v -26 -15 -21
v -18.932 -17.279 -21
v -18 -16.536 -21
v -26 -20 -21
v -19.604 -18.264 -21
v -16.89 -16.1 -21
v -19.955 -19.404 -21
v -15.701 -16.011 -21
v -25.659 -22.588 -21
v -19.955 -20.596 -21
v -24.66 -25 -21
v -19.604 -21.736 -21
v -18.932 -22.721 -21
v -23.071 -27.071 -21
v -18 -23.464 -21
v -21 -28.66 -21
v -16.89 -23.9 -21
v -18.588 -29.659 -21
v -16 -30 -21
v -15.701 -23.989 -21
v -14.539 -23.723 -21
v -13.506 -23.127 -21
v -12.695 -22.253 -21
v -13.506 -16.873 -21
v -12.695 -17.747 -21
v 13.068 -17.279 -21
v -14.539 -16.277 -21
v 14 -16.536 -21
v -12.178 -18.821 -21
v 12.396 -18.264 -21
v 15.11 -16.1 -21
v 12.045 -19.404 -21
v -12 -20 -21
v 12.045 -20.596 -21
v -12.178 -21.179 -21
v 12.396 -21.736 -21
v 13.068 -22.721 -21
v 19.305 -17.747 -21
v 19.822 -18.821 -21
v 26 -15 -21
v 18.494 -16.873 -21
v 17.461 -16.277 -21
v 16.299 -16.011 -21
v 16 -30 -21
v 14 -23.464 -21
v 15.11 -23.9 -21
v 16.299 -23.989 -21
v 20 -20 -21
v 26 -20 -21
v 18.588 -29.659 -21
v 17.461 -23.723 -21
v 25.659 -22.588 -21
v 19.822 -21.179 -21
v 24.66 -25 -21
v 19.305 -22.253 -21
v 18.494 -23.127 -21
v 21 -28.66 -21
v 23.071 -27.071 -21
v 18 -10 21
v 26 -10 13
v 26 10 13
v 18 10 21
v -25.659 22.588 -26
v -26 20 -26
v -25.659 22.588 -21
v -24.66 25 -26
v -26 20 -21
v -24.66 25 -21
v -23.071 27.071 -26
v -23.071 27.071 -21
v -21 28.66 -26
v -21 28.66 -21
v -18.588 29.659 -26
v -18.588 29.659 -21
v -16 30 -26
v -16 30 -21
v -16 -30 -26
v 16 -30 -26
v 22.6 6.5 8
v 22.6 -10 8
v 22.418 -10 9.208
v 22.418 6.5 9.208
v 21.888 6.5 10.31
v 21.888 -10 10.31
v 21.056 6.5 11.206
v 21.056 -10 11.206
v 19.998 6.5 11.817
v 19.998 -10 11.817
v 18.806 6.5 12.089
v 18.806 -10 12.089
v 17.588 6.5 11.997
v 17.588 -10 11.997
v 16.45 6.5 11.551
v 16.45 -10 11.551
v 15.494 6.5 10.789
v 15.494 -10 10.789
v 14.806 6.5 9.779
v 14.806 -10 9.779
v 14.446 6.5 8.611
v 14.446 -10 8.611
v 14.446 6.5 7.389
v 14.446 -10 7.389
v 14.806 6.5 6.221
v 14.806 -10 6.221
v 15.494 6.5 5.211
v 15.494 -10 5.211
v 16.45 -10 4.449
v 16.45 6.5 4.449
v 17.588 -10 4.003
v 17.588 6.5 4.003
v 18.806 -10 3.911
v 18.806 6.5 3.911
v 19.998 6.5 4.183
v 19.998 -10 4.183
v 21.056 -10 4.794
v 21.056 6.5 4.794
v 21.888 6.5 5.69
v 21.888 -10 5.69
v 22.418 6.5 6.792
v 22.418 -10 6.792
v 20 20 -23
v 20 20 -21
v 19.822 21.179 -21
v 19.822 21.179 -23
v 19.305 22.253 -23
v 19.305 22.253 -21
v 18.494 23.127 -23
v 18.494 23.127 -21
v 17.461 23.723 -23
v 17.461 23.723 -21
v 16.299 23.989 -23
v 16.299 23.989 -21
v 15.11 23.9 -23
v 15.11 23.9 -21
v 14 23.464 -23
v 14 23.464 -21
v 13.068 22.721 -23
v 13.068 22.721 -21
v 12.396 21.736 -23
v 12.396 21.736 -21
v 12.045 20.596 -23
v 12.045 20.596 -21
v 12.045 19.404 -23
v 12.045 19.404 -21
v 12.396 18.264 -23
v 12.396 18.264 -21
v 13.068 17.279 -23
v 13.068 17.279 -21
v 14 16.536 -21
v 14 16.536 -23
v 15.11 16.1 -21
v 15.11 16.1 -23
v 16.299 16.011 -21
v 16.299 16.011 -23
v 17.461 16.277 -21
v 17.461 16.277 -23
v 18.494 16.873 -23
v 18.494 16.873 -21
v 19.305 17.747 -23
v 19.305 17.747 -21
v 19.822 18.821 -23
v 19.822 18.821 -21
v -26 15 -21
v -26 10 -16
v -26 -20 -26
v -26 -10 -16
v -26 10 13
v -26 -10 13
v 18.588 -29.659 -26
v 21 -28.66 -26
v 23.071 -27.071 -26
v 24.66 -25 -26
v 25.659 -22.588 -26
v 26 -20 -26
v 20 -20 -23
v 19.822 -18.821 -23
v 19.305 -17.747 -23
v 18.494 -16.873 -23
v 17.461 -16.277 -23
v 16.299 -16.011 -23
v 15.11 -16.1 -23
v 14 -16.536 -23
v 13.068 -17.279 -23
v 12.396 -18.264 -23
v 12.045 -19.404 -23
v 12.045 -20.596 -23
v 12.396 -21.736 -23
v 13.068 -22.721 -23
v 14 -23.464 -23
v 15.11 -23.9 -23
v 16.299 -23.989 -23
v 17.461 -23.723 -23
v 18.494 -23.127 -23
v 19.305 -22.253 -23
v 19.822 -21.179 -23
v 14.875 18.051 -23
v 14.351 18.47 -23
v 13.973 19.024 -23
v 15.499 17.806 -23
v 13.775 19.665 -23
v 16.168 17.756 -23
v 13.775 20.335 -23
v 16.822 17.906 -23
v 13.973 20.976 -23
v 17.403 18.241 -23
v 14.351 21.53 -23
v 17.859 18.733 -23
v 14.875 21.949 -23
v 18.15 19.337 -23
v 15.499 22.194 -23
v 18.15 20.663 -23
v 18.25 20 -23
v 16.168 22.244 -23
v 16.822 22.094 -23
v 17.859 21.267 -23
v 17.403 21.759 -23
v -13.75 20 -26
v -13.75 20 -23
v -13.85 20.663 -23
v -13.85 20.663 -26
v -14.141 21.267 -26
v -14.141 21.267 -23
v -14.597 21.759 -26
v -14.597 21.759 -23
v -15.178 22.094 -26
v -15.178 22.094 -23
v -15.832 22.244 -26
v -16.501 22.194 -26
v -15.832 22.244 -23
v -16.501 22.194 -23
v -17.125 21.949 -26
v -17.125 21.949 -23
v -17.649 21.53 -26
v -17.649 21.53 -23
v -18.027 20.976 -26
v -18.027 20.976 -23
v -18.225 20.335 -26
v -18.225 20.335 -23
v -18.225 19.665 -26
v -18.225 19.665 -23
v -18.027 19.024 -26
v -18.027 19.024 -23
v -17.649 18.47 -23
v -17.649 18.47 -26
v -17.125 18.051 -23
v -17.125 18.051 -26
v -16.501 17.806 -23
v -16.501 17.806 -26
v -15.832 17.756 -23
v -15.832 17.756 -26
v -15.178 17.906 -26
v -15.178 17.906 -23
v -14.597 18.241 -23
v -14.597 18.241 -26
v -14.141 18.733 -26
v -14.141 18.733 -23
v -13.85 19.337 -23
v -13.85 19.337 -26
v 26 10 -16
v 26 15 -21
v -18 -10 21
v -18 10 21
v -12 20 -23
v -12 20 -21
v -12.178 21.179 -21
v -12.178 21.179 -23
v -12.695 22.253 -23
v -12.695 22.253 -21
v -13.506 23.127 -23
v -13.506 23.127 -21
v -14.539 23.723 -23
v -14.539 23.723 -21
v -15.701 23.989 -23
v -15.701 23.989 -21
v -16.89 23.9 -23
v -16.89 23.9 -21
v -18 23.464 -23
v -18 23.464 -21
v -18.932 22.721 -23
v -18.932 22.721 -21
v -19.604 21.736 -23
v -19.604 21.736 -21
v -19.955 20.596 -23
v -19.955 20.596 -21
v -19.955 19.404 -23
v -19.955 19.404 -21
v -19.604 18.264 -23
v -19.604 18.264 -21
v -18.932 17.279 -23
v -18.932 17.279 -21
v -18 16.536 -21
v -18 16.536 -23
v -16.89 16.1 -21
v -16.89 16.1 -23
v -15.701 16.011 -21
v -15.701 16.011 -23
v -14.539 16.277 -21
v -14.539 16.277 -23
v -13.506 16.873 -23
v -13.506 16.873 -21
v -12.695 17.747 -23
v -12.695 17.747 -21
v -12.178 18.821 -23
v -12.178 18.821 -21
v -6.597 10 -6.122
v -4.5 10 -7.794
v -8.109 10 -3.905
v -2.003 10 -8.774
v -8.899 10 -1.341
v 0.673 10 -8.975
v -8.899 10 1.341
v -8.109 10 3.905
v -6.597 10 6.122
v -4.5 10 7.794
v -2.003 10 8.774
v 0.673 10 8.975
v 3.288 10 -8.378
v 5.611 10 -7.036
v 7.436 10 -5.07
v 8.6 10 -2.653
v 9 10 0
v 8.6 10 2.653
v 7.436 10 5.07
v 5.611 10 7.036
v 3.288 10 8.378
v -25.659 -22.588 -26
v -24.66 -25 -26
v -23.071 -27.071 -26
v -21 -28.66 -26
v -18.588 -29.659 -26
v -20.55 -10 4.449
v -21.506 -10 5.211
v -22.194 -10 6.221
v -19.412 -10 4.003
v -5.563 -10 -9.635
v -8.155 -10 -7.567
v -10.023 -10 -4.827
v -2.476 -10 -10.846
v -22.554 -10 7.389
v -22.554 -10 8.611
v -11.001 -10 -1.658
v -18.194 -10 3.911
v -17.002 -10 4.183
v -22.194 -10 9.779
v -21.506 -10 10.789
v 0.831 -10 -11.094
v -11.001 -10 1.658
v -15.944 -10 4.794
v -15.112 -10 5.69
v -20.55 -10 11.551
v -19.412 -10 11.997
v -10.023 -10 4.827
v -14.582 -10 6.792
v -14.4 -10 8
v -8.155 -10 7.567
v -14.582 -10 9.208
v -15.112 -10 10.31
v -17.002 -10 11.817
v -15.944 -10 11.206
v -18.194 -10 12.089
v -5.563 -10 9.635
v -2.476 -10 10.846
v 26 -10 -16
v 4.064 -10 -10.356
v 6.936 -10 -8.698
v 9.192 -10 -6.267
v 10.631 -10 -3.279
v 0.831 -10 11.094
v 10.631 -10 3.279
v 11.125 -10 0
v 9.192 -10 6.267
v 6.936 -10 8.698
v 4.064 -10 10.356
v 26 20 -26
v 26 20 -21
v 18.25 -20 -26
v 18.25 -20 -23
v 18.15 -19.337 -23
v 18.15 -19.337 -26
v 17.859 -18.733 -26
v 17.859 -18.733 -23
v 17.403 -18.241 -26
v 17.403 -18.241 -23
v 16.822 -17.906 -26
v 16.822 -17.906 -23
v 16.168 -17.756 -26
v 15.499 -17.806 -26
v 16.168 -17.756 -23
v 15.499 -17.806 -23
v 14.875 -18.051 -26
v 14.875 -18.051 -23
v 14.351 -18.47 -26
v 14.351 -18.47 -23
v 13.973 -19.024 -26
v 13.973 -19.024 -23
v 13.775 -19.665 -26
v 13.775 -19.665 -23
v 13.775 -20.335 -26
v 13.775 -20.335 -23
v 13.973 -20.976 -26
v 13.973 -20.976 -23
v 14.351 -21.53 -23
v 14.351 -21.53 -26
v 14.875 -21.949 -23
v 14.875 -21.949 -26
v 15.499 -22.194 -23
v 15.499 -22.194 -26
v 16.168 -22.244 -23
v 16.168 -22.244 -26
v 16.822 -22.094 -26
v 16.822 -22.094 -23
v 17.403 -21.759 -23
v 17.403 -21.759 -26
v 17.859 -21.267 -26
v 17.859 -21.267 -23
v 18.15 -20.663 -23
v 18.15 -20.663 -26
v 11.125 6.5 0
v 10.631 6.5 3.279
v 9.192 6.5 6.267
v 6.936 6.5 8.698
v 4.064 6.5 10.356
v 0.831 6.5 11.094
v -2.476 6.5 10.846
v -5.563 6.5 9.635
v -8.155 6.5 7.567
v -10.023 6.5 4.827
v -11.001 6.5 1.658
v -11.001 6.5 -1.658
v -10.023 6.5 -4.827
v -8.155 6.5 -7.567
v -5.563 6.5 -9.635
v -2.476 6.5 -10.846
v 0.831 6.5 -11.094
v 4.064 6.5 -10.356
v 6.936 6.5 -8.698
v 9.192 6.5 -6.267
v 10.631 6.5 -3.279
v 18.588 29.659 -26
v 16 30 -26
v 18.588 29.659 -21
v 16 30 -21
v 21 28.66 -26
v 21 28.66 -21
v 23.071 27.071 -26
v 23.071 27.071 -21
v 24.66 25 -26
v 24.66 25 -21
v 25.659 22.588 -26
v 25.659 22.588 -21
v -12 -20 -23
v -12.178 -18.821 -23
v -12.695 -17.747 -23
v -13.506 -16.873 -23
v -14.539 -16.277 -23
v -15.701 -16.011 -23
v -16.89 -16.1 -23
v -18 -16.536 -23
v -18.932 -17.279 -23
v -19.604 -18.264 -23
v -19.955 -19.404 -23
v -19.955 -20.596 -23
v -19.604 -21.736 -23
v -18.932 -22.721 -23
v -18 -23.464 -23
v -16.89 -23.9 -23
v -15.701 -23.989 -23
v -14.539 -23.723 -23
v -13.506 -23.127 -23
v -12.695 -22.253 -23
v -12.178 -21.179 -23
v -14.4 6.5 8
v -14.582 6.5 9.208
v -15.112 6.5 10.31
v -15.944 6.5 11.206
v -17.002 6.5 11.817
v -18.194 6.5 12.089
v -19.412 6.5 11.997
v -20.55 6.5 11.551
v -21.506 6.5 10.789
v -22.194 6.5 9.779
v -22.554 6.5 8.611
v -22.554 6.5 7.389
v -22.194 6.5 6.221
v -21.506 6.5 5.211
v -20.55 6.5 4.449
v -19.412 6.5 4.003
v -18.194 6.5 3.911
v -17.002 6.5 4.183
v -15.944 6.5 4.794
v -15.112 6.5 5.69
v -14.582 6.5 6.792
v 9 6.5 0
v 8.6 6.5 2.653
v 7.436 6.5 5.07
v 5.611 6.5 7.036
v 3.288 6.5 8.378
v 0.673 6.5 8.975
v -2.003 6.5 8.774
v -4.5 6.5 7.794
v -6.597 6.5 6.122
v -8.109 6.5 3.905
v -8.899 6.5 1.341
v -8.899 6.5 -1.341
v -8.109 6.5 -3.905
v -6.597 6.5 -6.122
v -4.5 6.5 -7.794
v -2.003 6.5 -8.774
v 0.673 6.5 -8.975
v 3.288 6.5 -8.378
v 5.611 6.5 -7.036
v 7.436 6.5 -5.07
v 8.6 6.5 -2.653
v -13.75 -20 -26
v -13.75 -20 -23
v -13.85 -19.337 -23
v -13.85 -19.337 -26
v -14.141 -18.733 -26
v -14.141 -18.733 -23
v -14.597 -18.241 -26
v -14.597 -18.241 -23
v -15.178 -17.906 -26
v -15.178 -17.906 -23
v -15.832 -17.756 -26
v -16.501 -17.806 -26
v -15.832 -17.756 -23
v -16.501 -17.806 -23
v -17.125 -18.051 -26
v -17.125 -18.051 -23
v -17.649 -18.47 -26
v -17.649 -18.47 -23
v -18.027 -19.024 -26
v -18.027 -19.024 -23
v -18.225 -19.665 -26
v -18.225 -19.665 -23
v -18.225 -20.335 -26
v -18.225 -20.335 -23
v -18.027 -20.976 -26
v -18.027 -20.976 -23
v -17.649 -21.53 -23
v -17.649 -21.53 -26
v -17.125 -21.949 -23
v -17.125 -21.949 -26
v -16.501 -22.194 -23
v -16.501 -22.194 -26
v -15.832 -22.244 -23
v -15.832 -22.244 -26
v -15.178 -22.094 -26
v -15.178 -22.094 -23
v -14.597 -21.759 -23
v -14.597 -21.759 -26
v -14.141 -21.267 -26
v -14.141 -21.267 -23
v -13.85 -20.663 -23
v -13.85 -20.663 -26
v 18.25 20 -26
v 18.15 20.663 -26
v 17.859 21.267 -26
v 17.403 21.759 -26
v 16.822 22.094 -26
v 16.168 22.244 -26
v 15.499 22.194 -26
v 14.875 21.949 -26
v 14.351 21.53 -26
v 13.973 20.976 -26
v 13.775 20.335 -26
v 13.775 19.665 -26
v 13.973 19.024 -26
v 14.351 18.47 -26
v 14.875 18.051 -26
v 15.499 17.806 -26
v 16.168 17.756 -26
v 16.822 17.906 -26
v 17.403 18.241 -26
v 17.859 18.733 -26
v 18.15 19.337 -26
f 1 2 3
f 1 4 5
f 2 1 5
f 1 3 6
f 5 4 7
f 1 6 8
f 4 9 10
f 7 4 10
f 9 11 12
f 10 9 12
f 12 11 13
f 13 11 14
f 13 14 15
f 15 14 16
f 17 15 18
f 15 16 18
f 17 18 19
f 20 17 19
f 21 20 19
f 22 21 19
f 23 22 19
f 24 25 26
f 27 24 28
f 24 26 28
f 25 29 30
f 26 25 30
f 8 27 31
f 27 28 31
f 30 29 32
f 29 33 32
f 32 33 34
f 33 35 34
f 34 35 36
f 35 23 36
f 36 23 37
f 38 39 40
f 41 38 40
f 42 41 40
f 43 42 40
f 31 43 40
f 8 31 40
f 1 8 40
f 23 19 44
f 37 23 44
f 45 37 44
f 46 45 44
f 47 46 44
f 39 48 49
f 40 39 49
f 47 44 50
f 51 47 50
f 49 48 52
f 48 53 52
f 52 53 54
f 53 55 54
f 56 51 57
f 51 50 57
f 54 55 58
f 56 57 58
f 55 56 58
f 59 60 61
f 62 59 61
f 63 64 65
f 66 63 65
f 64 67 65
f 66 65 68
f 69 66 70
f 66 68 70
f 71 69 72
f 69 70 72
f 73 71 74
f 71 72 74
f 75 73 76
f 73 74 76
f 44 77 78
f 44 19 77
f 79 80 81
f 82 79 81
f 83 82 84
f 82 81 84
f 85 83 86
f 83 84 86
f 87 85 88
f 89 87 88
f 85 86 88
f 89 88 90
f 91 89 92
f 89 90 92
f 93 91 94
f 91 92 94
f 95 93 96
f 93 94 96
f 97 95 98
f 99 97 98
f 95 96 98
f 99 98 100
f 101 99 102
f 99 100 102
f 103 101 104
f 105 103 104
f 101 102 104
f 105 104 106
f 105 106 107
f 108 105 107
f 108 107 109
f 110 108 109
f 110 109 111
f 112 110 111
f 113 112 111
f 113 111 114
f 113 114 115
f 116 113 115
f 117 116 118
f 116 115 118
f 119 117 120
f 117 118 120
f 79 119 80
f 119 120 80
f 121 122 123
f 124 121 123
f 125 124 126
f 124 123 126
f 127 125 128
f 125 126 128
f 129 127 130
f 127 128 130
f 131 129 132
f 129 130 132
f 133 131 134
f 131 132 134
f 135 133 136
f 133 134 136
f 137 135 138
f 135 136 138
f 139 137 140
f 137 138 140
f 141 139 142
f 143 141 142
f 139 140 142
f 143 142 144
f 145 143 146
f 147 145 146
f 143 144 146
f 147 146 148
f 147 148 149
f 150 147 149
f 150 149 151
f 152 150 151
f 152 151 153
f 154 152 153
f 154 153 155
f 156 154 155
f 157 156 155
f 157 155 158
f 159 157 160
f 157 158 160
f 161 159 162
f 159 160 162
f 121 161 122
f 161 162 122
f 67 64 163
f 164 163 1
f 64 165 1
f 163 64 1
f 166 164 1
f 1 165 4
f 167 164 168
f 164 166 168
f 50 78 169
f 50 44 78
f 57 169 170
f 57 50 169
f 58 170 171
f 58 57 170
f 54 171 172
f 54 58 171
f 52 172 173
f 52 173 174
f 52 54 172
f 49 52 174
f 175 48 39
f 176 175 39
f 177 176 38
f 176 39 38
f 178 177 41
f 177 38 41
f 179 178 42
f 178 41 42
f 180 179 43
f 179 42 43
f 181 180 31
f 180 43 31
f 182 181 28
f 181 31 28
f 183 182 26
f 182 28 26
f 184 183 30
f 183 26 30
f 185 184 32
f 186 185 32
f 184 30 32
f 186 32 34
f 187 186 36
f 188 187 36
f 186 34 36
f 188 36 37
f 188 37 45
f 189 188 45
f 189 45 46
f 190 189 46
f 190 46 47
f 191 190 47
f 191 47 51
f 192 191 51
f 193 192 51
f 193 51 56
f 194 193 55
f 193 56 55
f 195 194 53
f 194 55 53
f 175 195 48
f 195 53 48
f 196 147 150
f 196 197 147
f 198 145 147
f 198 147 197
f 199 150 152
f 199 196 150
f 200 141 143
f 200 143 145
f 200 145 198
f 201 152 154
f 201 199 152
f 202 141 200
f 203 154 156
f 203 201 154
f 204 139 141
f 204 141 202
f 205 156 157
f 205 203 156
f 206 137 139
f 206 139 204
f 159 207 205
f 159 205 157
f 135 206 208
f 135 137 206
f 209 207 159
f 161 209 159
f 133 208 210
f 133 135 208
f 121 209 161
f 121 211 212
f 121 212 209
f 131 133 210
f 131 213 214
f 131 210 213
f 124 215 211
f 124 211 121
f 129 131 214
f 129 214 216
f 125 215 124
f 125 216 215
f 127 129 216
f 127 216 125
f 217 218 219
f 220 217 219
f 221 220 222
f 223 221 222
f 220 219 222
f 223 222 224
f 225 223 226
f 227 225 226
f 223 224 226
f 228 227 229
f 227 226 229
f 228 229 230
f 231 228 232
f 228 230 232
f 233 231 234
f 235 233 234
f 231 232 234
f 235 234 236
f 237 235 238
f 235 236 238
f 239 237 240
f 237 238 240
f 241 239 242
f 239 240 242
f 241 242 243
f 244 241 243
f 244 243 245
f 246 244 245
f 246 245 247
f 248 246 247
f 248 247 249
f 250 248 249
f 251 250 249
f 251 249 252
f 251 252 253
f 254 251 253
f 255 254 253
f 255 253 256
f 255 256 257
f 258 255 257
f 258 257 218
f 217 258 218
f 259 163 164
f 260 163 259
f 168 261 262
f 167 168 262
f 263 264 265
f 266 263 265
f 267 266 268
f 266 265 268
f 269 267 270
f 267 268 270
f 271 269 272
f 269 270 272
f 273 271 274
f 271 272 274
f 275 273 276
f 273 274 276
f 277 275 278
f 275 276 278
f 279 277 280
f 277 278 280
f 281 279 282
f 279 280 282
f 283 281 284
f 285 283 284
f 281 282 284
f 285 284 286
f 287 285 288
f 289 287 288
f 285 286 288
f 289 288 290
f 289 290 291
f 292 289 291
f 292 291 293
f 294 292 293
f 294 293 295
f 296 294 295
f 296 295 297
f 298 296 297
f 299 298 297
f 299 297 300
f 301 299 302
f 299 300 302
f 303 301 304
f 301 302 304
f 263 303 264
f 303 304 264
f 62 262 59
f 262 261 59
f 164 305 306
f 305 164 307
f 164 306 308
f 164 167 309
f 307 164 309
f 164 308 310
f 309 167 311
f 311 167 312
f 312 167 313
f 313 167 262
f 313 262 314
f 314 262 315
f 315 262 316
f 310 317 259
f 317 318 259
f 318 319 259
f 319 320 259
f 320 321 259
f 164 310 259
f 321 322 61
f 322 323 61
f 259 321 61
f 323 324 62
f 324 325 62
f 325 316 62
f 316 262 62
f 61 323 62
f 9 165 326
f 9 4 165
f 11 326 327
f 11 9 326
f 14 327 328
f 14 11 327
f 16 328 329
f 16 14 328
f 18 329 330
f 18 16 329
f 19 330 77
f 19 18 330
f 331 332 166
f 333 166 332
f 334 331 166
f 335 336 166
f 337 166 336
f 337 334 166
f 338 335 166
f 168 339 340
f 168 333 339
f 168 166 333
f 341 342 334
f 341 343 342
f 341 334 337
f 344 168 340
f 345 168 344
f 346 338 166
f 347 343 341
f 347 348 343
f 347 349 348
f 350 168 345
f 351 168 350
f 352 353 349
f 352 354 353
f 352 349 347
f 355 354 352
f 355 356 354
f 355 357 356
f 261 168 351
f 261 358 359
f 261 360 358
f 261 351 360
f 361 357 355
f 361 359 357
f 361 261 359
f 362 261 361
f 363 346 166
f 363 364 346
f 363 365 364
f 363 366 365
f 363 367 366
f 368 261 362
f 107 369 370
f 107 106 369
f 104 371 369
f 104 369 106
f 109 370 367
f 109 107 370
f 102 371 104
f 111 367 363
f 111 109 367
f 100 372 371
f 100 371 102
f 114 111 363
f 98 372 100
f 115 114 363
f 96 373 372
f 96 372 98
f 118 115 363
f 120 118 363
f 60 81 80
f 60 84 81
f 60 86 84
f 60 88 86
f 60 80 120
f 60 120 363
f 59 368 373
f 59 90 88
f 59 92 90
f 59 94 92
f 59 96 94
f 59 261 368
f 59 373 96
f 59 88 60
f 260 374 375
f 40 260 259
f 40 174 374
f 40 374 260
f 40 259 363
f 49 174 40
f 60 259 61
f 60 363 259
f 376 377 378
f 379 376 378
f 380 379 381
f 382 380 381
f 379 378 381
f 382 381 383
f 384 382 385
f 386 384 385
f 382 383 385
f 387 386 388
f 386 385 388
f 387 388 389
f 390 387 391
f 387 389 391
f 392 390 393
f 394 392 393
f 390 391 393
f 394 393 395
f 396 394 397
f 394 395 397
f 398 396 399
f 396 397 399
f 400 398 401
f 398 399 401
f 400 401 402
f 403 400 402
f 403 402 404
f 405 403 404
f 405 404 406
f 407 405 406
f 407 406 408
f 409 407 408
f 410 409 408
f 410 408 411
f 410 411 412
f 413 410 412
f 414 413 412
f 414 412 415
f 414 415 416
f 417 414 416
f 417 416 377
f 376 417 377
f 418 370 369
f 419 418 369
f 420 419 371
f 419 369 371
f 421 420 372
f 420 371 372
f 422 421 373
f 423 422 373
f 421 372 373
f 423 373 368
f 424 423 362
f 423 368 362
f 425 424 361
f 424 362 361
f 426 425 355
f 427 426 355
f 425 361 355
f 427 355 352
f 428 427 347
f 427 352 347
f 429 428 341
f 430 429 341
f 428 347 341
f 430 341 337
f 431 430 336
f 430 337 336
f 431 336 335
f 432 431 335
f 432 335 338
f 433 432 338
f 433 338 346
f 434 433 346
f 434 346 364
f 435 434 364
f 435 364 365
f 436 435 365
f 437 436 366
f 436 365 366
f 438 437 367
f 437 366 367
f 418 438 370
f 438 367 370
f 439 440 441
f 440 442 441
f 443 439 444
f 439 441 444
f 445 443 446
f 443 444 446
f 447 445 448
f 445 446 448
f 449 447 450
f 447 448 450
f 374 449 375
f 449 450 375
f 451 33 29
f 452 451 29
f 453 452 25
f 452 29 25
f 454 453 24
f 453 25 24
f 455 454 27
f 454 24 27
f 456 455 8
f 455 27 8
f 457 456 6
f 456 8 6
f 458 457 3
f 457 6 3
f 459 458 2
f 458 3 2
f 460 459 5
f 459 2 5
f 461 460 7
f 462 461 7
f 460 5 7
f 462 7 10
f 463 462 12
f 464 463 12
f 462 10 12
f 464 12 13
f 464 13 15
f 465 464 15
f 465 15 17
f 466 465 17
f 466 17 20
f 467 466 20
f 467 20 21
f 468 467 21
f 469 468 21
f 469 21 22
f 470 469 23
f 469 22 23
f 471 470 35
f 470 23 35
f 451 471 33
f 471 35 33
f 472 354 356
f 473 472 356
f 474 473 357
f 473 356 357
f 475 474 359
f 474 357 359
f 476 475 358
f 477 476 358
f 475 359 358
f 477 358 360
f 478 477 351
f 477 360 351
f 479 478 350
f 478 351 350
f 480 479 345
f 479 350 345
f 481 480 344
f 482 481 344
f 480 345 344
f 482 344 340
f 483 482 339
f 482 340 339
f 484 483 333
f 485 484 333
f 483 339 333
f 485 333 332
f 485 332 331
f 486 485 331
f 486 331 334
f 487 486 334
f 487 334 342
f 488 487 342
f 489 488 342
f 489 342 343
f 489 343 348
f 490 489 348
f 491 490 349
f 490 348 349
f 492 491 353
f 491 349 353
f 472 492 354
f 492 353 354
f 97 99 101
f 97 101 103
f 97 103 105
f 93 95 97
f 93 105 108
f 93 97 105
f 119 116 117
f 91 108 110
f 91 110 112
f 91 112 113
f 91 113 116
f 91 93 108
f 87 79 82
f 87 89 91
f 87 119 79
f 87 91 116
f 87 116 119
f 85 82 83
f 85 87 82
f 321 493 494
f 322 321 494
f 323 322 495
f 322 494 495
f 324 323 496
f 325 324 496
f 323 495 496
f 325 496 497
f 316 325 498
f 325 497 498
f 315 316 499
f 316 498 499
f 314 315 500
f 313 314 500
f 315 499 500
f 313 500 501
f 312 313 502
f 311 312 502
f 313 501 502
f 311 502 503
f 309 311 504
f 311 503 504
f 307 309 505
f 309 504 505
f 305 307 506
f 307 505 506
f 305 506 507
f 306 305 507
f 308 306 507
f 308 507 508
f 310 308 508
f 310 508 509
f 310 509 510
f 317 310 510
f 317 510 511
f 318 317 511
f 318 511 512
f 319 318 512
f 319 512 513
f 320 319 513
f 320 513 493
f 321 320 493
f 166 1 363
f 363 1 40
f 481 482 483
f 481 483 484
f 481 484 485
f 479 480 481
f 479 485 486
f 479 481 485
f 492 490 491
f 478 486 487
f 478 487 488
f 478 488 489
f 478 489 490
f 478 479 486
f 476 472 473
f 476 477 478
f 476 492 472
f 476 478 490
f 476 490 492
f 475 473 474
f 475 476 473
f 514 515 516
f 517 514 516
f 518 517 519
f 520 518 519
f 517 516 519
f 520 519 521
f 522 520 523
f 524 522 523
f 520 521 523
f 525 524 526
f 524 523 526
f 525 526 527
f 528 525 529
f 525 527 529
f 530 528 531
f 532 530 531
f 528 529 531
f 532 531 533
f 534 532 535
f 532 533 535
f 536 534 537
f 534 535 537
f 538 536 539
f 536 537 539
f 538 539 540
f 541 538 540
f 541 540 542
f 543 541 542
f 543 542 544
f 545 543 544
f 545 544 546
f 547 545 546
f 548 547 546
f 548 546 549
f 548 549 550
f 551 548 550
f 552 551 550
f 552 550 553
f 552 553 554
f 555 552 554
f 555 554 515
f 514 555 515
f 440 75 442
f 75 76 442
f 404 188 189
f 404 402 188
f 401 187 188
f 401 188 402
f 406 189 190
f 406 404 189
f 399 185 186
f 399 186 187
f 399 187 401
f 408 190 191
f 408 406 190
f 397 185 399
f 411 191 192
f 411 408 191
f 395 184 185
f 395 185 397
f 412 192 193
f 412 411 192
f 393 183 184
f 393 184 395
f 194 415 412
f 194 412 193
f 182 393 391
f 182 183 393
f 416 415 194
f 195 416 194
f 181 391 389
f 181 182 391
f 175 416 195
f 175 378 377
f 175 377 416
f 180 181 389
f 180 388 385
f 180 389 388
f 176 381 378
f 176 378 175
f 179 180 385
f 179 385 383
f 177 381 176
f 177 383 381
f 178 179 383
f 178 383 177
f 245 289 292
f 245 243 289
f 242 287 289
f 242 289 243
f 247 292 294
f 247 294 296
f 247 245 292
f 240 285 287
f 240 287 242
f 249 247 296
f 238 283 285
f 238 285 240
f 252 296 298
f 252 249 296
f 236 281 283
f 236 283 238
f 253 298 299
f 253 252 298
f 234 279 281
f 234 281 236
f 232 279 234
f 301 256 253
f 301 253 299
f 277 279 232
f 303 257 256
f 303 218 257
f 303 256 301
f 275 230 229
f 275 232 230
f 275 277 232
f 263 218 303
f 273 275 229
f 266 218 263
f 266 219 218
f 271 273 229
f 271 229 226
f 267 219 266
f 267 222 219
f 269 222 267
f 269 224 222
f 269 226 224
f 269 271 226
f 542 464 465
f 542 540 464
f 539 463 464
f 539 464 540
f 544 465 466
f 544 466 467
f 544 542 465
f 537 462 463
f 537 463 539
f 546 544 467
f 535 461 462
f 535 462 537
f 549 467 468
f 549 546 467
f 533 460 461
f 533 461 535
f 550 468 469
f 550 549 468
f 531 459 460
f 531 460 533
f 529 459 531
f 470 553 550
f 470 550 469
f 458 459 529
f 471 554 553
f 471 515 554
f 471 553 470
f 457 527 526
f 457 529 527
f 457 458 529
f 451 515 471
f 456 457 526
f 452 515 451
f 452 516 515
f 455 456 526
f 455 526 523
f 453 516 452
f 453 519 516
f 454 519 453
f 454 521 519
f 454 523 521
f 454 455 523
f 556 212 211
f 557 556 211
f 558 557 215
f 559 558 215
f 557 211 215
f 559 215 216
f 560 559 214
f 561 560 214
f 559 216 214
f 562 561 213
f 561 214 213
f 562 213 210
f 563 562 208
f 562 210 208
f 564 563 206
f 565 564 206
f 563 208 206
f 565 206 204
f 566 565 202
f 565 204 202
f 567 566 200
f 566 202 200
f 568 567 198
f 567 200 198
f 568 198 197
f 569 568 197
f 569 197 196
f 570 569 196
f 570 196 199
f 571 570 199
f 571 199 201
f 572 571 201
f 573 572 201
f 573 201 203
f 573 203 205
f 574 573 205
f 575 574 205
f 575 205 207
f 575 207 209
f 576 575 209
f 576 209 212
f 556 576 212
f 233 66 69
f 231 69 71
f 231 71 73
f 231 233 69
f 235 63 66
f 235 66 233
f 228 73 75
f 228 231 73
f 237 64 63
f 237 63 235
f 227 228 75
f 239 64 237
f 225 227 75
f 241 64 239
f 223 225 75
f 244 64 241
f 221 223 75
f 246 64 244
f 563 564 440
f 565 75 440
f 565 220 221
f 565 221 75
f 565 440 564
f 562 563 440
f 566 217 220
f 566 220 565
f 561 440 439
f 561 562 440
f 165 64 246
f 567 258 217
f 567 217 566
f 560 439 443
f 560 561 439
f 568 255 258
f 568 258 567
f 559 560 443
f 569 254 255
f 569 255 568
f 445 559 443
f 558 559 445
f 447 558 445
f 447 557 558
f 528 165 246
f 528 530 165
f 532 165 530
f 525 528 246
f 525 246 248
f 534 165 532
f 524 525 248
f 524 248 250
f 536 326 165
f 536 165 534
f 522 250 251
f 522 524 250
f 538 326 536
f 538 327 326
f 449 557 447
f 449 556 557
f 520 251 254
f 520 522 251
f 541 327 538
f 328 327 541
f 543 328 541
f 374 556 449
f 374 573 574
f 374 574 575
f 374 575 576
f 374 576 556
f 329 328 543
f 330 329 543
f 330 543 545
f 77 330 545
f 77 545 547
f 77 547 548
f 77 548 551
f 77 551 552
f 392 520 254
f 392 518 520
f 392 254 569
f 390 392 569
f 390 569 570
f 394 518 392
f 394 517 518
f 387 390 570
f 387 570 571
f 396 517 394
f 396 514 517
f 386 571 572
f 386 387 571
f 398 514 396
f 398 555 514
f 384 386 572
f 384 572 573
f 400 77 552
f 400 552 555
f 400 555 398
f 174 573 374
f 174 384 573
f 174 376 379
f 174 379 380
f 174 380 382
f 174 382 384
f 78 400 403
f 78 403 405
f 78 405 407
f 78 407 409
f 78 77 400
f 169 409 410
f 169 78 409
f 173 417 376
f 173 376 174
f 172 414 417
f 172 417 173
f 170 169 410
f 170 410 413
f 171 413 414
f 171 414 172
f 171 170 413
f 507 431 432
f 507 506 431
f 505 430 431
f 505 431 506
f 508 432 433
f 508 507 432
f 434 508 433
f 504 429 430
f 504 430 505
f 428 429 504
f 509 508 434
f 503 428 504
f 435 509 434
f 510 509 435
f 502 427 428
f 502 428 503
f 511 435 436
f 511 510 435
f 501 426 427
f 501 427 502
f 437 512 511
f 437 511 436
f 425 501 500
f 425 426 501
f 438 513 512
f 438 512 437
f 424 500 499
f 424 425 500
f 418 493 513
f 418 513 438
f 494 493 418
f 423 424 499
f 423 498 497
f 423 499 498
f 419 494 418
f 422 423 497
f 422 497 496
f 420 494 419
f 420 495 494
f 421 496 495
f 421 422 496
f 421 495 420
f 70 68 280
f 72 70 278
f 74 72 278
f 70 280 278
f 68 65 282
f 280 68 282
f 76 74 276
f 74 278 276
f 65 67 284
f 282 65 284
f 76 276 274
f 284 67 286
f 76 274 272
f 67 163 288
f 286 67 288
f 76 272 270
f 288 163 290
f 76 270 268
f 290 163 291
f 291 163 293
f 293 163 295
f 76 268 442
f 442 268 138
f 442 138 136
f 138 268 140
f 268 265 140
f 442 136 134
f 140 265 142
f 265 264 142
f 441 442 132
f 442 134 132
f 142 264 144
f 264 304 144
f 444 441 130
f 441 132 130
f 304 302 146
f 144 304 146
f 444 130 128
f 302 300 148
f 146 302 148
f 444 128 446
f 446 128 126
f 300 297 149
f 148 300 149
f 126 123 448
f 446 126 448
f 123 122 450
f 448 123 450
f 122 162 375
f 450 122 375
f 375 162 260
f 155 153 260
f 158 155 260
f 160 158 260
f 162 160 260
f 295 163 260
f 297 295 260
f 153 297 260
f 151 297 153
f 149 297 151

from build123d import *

# Parameters (mm, degrees)
F0_W      = 52
F0_H      = 42
F1_DEPTH  = 10
F2_W      = 52
F2_H      = 5
F3_DEPTH  = 30
F4_R      = 9
F5_DEPTH  = 40.001
F6_R      = 11.125
F6_R_2    = 4.1
F7_DEPTH  = 16.5
F8_R      = 2.25
F9_DEPTH  = 5.001
F10_R     = 4
F11_DEPTH = 2
F12_SIZE  = 8
F13_SIZE  = 5
F14_R     = 10


with BuildPart() as f1:
    # F0 (on Front) → F1 (new body, symmetric)
    with BuildSketch(Plane.XZ):
        Rectangle(F0_W, F0_H)
    extrude(amount=F1_DEPTH, both=True)

    # F2 (on Front) → F3 (join, symmetric)
    with BuildSketch(Plane.XZ):
        with Locations((0, -23.5)):
            Rectangle(F2_W, F2_H)
    extrude(amount=F3_DEPTH, both=True)

    # F4 (on face) → F5 (cut, through all)
    with BuildSketch(Plane.XZ.offset(10)):
        Circle(F4_R)
    extrude(amount=-F5_DEPTH, mode=Mode.SUBTRACT)

    # F6 (on face) → F7 (cut)
    with BuildSketch(Plane.XZ.offset(10)):
        Circle(F6_R)
        with Locations((-18.5, 8)):
            Circle(F6_R_2)
        with Locations((18.5, 8)):
            Circle(F6_R_2)
    extrude(amount=-F7_DEPTH, mode=Mode.SUBTRACT)

    # F8 (on face) → F9 (cut, through all)
    with BuildSketch(Plane.XY.offset(-21)):
        with Locations((-16, 20)):
            Circle(F8_R)
        with Locations((16, 20)):
            Circle(F8_R)
        with Locations((16, -20)):
            Circle(F8_R)
        with Locations((-16, -20)):
            Circle(F8_R)
    extrude(amount=-F9_DEPTH, mode=Mode.SUBTRACT)

    # F10 (on face) → F11 (cut)
    with BuildSketch(Plane.XY.offset(-21)):
        with Locations((-16, 20)):
            Circle(F10_R)
        with Locations((16, 20)):
            Circle(F10_R)
        with Locations((-16, -20)):
            Circle(F10_R)
        with Locations((16, -20)):
            Circle(F10_R)
    extrude(amount=-F11_DEPTH, mode=Mode.SUBTRACT)

    # F12
    f12_edges = [f1.edges().sort_by_distance(p)[0] for p in [
        (-26, 0, 21),
        (26, 0, 21),
    ]]
    chamfer(f12_edges, length=F12_SIZE)

    # F13
    f13_edges = [f1.edges().sort_by_distance(p)[0] for p in [
        (0, -10, -21),
        (0, 10, -21),
    ]]
    chamfer(f13_edges, length=F13_SIZE)

    # F14
    f14_edges = [f1.edges().sort_by_distance(p)[0] for p in [
        (26, 30, -23.5),
        (-26, 30, -23.5),
        (26, -30, -23.5),
        (-26, -30, -23.5),
    ]]
    fillet(f14_edges, radius=F14_R)


solid = f1.part
